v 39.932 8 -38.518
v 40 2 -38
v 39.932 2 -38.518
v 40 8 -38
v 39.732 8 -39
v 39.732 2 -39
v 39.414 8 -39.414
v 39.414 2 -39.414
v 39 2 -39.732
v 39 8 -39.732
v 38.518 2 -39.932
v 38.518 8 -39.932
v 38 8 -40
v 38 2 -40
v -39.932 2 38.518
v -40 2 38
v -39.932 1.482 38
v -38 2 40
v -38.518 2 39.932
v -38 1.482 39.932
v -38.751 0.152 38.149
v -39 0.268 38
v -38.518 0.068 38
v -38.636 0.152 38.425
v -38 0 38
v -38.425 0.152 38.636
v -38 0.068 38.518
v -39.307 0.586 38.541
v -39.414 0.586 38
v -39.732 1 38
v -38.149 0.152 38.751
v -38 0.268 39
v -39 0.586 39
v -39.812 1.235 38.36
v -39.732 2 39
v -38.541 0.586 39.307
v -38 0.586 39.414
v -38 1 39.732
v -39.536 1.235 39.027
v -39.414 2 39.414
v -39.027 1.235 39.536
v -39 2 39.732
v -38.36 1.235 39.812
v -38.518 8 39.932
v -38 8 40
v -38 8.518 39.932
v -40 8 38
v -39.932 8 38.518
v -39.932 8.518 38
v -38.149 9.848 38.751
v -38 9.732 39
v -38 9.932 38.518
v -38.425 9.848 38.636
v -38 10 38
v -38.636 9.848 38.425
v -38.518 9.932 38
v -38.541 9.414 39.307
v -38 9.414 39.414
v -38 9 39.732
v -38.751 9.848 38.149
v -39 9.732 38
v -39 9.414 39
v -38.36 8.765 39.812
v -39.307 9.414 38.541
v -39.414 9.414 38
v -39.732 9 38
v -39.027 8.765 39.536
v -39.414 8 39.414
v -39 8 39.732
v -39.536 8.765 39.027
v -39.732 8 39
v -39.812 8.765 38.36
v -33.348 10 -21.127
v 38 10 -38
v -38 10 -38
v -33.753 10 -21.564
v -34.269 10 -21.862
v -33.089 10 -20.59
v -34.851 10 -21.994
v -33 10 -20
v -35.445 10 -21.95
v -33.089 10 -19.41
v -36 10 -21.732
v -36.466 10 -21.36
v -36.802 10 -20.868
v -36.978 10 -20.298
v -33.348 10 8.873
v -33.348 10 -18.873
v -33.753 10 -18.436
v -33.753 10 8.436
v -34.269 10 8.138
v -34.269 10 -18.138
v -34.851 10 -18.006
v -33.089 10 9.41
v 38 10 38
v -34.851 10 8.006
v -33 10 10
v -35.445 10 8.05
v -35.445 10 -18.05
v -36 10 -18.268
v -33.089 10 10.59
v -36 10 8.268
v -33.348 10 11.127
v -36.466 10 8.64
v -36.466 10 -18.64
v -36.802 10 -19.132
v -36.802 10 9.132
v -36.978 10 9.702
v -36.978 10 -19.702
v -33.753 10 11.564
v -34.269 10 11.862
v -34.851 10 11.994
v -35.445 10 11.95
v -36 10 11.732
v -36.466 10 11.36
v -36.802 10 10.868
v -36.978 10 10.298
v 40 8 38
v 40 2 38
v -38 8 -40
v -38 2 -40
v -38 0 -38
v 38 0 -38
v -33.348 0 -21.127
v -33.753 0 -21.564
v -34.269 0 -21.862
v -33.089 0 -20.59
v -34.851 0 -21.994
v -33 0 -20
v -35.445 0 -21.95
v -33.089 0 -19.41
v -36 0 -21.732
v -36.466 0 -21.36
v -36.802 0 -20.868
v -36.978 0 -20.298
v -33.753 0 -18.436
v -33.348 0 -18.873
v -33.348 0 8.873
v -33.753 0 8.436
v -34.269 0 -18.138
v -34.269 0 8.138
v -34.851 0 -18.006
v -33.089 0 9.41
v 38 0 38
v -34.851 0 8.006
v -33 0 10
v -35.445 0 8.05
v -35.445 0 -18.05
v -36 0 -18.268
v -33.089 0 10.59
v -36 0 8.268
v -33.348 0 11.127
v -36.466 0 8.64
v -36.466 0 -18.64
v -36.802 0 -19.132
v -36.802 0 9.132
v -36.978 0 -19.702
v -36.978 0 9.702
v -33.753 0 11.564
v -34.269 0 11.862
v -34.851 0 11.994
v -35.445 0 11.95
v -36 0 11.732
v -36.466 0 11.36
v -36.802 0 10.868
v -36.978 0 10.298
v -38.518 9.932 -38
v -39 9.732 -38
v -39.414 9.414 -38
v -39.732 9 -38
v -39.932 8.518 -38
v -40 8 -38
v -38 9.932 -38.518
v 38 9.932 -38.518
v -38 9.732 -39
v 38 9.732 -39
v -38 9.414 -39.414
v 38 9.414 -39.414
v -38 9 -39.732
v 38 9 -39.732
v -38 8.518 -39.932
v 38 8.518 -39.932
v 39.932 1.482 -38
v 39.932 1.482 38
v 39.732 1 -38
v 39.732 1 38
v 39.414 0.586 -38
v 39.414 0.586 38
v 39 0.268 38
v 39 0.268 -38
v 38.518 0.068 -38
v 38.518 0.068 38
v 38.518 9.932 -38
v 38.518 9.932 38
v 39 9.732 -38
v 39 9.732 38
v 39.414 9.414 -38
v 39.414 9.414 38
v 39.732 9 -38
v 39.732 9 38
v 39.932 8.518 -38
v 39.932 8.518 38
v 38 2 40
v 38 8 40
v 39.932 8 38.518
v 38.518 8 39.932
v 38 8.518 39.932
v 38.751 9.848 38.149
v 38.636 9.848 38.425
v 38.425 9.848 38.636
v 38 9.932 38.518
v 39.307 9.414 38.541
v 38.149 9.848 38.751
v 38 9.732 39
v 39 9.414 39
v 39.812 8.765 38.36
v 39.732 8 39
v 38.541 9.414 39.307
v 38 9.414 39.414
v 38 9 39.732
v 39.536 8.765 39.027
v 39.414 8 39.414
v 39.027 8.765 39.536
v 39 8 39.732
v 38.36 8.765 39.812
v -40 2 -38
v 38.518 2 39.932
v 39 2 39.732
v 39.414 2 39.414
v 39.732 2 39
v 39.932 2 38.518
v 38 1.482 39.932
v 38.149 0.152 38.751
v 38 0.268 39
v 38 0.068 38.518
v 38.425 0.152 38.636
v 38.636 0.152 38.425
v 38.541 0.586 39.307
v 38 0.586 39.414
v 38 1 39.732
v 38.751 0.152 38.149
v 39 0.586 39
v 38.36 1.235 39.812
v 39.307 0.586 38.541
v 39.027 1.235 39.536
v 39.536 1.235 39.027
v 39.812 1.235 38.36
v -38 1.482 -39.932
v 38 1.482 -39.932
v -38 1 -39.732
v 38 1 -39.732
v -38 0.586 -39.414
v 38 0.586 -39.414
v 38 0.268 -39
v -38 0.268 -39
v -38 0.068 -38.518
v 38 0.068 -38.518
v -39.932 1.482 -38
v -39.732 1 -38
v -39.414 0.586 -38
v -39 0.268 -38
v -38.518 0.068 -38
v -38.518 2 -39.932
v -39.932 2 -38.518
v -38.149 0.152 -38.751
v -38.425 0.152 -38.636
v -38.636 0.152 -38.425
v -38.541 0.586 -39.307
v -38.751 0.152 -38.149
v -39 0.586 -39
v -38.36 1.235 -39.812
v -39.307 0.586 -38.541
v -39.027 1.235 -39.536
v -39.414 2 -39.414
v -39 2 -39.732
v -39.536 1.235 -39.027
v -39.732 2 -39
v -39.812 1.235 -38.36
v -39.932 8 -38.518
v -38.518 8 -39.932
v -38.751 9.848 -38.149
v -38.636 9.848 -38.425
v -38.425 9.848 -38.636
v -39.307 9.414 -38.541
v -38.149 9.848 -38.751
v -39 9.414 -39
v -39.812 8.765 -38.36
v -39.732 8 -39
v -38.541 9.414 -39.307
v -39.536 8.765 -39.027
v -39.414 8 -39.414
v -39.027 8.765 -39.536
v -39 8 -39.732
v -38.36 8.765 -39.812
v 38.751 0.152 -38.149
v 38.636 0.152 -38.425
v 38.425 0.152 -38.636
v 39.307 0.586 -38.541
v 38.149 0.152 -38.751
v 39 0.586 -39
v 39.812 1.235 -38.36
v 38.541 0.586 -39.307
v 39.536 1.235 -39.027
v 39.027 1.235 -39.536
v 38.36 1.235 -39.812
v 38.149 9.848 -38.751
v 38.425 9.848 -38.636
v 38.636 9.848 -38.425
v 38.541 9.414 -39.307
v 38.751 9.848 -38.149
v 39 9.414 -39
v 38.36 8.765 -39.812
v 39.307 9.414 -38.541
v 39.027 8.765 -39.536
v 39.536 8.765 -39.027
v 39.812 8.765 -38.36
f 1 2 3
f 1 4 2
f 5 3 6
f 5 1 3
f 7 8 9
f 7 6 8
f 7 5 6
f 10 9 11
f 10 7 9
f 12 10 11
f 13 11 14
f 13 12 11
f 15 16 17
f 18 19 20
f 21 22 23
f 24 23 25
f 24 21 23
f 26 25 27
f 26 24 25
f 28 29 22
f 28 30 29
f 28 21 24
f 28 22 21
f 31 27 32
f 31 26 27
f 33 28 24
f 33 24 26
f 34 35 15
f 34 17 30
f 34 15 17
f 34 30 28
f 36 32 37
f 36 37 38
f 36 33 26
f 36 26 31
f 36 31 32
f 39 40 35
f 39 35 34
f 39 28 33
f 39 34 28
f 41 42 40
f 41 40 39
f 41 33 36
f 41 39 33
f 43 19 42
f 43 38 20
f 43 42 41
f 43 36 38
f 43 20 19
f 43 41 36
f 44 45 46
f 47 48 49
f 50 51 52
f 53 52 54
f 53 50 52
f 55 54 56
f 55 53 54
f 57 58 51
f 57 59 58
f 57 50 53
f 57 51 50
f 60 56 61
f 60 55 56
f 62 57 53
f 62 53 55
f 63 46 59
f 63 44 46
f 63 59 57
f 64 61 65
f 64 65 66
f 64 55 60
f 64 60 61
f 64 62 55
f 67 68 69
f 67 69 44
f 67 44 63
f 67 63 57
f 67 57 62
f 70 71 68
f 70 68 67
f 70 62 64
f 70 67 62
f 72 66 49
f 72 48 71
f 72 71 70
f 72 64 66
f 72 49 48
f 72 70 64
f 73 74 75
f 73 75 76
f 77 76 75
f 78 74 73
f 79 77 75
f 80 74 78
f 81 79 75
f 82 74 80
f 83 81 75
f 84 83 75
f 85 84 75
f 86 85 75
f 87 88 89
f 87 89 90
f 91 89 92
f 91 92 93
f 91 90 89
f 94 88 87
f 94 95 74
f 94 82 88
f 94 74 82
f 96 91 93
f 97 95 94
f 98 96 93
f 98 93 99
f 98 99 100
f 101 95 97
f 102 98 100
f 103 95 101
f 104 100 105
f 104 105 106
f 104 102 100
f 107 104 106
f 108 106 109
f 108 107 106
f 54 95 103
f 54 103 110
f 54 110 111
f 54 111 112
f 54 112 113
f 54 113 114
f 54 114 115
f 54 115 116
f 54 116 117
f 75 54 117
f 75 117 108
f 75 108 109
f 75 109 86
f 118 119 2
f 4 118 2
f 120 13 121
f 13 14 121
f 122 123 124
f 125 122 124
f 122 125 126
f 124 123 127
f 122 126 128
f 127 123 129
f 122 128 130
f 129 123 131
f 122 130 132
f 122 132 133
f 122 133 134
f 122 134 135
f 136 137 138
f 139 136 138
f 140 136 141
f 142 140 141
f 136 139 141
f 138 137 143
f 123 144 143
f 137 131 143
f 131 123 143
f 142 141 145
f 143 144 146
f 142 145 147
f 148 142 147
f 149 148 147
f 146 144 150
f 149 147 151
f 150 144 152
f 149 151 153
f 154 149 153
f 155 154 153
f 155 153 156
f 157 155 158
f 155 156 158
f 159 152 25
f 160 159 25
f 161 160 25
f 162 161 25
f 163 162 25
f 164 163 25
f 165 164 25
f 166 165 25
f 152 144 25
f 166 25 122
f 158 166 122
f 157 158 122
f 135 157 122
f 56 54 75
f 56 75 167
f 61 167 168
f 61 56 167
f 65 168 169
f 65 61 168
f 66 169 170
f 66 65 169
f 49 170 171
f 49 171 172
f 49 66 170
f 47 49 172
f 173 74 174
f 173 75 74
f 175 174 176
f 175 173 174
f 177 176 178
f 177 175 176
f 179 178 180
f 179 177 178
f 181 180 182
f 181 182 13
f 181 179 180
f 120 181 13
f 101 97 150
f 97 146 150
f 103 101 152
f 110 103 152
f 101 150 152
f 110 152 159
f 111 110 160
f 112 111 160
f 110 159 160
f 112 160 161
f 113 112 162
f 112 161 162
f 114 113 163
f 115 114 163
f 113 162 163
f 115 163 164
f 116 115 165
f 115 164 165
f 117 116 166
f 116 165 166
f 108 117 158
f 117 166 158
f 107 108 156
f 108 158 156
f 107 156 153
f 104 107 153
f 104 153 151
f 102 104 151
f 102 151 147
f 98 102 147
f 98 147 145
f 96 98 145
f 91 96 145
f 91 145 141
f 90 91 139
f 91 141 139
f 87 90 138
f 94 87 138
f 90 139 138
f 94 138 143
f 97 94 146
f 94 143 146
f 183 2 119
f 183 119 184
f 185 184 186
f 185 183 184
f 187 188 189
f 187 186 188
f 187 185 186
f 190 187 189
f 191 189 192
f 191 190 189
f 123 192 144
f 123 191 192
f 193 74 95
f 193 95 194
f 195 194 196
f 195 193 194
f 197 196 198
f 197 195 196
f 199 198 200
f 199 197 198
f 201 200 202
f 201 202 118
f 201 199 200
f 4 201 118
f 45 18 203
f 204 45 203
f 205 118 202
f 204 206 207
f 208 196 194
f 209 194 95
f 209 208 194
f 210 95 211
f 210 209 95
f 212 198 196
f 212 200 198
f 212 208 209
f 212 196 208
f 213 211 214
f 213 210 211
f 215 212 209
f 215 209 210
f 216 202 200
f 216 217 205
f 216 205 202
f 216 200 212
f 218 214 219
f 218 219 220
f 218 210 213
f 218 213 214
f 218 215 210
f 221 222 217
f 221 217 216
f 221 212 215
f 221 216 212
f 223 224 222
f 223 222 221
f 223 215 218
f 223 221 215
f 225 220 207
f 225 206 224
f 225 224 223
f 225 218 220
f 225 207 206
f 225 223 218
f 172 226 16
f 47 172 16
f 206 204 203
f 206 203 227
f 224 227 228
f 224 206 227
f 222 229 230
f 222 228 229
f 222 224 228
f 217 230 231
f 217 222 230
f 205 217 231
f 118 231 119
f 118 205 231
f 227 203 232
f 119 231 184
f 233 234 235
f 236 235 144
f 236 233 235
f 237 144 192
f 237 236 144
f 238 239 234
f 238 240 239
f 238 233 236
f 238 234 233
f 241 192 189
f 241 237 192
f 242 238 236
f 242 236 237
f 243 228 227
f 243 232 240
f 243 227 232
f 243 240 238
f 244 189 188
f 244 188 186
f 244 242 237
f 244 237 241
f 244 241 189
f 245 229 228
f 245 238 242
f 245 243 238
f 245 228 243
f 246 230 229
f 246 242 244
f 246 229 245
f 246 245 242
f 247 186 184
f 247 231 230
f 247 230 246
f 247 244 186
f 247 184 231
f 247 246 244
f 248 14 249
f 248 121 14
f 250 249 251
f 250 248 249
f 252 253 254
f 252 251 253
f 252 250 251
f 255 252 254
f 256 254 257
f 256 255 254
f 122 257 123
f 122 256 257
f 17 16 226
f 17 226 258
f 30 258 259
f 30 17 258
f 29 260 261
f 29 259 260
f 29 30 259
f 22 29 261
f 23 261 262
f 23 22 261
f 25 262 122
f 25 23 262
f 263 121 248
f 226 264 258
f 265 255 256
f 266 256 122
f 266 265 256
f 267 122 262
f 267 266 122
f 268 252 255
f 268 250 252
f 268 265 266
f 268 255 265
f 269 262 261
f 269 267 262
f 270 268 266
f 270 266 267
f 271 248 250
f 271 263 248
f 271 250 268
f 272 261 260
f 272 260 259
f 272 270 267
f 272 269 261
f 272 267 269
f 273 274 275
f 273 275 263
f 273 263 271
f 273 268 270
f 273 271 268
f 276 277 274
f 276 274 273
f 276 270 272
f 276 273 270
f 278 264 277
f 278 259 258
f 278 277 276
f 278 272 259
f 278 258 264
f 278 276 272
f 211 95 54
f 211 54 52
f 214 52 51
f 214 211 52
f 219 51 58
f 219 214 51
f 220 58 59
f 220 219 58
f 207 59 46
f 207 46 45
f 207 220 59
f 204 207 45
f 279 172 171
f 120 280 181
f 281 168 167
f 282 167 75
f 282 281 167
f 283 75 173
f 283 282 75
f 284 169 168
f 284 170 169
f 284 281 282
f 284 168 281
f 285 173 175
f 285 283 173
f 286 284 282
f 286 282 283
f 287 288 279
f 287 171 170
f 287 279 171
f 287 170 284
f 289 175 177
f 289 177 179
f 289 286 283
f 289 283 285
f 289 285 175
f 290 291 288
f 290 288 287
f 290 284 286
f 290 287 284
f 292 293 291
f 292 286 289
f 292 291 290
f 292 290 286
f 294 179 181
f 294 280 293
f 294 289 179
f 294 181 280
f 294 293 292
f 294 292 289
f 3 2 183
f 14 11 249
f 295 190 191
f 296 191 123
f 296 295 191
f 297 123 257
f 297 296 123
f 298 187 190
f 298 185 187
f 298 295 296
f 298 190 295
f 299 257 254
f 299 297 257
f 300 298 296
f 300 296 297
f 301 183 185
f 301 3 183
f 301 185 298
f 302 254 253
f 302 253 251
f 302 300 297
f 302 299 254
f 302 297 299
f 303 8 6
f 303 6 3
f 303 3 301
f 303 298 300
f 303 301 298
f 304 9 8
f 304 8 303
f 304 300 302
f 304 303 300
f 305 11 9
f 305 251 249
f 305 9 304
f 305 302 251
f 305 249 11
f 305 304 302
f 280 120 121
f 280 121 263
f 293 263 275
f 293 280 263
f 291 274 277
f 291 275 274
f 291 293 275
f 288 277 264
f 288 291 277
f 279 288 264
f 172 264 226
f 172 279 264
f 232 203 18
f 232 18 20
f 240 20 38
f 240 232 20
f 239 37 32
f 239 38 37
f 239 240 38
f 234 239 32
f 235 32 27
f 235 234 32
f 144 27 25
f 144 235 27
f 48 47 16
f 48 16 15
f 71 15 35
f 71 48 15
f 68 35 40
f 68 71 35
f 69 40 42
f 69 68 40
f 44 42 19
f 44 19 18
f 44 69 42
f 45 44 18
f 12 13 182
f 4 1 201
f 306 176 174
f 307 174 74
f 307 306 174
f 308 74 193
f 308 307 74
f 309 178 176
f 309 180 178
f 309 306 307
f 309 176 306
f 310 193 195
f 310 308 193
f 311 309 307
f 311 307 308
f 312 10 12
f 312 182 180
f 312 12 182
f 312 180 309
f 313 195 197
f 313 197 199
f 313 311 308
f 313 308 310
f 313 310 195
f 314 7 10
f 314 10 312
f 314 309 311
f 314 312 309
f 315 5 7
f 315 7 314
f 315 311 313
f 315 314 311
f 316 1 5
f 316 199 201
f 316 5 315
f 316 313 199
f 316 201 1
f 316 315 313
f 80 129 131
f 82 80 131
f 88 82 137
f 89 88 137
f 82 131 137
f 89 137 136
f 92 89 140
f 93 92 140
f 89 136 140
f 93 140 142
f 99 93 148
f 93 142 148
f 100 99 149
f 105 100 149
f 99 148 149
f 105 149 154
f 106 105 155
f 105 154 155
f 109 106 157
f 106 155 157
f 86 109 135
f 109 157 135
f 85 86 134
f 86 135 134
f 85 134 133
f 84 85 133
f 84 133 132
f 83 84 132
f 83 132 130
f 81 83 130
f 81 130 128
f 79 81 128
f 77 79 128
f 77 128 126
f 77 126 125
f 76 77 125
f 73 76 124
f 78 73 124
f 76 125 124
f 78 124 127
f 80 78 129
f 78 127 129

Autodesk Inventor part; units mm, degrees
ref_plane "YZ Plane" through (0, 0, 0) normal (1, 0, 0) x (0, 1, 0)
ref_plane "XZ Plane" through (0, 0, 0) normal (0, 1, 0) x (-1, 0, 0)
ref_plane "XY Plane" through (0, 0, 0) normal (0, 0, 1) x (1, 0, 0)
sketch "草图1" plane through (0, 0, 0) normal (0, 1, 0) x (-1, 0, 0)
  line L0 (40, 40) -> (-40, 40)
  line L1 (-40, 40) -> (-40, -40)
  line L2 (-40, -40) -> (40, -40)
  line L3 (40, -40) -> (40, 40)
  point P0 (0, 0)
  dimension "d13" = 80
  dimension "d14" = 80
extrude "拉伸1" add sketch "草图1" along normal blind 10
fillet "圆角1" radius 2 12 edges at (-40, 5, -40) (-40, 5, 40) (-40, 0, 0) (-40, 10, 0) (40, 5, -40) (0, 0, -40) (0, 10, -40) (40, 5, 40) (40, 0, 0) (40, 10, 0) (0, 0, 40) (0, 10, 40)
sketch "草图4" plane through (0, 0, 0) normal (0, -1, 0) x (1, 0, 0)
  circle A0 centre (-35, -20) radius 2
  point P0 (0, 0)
  dimension "d15" = 4
extrude "拉伸4" cut sketch "草图4" against normal through all
sketch "草图5" plane through (0, 0, 0) normal (0, -1, 0) x (1, 0, 0)
  circle A0 centre (-35, 10) radius 2
  point P0 (0, 0)
  dimension "d18" = 4
extrude "拉伸5" cut sketch "草图5" against normal through all
properties part number "升降板"
